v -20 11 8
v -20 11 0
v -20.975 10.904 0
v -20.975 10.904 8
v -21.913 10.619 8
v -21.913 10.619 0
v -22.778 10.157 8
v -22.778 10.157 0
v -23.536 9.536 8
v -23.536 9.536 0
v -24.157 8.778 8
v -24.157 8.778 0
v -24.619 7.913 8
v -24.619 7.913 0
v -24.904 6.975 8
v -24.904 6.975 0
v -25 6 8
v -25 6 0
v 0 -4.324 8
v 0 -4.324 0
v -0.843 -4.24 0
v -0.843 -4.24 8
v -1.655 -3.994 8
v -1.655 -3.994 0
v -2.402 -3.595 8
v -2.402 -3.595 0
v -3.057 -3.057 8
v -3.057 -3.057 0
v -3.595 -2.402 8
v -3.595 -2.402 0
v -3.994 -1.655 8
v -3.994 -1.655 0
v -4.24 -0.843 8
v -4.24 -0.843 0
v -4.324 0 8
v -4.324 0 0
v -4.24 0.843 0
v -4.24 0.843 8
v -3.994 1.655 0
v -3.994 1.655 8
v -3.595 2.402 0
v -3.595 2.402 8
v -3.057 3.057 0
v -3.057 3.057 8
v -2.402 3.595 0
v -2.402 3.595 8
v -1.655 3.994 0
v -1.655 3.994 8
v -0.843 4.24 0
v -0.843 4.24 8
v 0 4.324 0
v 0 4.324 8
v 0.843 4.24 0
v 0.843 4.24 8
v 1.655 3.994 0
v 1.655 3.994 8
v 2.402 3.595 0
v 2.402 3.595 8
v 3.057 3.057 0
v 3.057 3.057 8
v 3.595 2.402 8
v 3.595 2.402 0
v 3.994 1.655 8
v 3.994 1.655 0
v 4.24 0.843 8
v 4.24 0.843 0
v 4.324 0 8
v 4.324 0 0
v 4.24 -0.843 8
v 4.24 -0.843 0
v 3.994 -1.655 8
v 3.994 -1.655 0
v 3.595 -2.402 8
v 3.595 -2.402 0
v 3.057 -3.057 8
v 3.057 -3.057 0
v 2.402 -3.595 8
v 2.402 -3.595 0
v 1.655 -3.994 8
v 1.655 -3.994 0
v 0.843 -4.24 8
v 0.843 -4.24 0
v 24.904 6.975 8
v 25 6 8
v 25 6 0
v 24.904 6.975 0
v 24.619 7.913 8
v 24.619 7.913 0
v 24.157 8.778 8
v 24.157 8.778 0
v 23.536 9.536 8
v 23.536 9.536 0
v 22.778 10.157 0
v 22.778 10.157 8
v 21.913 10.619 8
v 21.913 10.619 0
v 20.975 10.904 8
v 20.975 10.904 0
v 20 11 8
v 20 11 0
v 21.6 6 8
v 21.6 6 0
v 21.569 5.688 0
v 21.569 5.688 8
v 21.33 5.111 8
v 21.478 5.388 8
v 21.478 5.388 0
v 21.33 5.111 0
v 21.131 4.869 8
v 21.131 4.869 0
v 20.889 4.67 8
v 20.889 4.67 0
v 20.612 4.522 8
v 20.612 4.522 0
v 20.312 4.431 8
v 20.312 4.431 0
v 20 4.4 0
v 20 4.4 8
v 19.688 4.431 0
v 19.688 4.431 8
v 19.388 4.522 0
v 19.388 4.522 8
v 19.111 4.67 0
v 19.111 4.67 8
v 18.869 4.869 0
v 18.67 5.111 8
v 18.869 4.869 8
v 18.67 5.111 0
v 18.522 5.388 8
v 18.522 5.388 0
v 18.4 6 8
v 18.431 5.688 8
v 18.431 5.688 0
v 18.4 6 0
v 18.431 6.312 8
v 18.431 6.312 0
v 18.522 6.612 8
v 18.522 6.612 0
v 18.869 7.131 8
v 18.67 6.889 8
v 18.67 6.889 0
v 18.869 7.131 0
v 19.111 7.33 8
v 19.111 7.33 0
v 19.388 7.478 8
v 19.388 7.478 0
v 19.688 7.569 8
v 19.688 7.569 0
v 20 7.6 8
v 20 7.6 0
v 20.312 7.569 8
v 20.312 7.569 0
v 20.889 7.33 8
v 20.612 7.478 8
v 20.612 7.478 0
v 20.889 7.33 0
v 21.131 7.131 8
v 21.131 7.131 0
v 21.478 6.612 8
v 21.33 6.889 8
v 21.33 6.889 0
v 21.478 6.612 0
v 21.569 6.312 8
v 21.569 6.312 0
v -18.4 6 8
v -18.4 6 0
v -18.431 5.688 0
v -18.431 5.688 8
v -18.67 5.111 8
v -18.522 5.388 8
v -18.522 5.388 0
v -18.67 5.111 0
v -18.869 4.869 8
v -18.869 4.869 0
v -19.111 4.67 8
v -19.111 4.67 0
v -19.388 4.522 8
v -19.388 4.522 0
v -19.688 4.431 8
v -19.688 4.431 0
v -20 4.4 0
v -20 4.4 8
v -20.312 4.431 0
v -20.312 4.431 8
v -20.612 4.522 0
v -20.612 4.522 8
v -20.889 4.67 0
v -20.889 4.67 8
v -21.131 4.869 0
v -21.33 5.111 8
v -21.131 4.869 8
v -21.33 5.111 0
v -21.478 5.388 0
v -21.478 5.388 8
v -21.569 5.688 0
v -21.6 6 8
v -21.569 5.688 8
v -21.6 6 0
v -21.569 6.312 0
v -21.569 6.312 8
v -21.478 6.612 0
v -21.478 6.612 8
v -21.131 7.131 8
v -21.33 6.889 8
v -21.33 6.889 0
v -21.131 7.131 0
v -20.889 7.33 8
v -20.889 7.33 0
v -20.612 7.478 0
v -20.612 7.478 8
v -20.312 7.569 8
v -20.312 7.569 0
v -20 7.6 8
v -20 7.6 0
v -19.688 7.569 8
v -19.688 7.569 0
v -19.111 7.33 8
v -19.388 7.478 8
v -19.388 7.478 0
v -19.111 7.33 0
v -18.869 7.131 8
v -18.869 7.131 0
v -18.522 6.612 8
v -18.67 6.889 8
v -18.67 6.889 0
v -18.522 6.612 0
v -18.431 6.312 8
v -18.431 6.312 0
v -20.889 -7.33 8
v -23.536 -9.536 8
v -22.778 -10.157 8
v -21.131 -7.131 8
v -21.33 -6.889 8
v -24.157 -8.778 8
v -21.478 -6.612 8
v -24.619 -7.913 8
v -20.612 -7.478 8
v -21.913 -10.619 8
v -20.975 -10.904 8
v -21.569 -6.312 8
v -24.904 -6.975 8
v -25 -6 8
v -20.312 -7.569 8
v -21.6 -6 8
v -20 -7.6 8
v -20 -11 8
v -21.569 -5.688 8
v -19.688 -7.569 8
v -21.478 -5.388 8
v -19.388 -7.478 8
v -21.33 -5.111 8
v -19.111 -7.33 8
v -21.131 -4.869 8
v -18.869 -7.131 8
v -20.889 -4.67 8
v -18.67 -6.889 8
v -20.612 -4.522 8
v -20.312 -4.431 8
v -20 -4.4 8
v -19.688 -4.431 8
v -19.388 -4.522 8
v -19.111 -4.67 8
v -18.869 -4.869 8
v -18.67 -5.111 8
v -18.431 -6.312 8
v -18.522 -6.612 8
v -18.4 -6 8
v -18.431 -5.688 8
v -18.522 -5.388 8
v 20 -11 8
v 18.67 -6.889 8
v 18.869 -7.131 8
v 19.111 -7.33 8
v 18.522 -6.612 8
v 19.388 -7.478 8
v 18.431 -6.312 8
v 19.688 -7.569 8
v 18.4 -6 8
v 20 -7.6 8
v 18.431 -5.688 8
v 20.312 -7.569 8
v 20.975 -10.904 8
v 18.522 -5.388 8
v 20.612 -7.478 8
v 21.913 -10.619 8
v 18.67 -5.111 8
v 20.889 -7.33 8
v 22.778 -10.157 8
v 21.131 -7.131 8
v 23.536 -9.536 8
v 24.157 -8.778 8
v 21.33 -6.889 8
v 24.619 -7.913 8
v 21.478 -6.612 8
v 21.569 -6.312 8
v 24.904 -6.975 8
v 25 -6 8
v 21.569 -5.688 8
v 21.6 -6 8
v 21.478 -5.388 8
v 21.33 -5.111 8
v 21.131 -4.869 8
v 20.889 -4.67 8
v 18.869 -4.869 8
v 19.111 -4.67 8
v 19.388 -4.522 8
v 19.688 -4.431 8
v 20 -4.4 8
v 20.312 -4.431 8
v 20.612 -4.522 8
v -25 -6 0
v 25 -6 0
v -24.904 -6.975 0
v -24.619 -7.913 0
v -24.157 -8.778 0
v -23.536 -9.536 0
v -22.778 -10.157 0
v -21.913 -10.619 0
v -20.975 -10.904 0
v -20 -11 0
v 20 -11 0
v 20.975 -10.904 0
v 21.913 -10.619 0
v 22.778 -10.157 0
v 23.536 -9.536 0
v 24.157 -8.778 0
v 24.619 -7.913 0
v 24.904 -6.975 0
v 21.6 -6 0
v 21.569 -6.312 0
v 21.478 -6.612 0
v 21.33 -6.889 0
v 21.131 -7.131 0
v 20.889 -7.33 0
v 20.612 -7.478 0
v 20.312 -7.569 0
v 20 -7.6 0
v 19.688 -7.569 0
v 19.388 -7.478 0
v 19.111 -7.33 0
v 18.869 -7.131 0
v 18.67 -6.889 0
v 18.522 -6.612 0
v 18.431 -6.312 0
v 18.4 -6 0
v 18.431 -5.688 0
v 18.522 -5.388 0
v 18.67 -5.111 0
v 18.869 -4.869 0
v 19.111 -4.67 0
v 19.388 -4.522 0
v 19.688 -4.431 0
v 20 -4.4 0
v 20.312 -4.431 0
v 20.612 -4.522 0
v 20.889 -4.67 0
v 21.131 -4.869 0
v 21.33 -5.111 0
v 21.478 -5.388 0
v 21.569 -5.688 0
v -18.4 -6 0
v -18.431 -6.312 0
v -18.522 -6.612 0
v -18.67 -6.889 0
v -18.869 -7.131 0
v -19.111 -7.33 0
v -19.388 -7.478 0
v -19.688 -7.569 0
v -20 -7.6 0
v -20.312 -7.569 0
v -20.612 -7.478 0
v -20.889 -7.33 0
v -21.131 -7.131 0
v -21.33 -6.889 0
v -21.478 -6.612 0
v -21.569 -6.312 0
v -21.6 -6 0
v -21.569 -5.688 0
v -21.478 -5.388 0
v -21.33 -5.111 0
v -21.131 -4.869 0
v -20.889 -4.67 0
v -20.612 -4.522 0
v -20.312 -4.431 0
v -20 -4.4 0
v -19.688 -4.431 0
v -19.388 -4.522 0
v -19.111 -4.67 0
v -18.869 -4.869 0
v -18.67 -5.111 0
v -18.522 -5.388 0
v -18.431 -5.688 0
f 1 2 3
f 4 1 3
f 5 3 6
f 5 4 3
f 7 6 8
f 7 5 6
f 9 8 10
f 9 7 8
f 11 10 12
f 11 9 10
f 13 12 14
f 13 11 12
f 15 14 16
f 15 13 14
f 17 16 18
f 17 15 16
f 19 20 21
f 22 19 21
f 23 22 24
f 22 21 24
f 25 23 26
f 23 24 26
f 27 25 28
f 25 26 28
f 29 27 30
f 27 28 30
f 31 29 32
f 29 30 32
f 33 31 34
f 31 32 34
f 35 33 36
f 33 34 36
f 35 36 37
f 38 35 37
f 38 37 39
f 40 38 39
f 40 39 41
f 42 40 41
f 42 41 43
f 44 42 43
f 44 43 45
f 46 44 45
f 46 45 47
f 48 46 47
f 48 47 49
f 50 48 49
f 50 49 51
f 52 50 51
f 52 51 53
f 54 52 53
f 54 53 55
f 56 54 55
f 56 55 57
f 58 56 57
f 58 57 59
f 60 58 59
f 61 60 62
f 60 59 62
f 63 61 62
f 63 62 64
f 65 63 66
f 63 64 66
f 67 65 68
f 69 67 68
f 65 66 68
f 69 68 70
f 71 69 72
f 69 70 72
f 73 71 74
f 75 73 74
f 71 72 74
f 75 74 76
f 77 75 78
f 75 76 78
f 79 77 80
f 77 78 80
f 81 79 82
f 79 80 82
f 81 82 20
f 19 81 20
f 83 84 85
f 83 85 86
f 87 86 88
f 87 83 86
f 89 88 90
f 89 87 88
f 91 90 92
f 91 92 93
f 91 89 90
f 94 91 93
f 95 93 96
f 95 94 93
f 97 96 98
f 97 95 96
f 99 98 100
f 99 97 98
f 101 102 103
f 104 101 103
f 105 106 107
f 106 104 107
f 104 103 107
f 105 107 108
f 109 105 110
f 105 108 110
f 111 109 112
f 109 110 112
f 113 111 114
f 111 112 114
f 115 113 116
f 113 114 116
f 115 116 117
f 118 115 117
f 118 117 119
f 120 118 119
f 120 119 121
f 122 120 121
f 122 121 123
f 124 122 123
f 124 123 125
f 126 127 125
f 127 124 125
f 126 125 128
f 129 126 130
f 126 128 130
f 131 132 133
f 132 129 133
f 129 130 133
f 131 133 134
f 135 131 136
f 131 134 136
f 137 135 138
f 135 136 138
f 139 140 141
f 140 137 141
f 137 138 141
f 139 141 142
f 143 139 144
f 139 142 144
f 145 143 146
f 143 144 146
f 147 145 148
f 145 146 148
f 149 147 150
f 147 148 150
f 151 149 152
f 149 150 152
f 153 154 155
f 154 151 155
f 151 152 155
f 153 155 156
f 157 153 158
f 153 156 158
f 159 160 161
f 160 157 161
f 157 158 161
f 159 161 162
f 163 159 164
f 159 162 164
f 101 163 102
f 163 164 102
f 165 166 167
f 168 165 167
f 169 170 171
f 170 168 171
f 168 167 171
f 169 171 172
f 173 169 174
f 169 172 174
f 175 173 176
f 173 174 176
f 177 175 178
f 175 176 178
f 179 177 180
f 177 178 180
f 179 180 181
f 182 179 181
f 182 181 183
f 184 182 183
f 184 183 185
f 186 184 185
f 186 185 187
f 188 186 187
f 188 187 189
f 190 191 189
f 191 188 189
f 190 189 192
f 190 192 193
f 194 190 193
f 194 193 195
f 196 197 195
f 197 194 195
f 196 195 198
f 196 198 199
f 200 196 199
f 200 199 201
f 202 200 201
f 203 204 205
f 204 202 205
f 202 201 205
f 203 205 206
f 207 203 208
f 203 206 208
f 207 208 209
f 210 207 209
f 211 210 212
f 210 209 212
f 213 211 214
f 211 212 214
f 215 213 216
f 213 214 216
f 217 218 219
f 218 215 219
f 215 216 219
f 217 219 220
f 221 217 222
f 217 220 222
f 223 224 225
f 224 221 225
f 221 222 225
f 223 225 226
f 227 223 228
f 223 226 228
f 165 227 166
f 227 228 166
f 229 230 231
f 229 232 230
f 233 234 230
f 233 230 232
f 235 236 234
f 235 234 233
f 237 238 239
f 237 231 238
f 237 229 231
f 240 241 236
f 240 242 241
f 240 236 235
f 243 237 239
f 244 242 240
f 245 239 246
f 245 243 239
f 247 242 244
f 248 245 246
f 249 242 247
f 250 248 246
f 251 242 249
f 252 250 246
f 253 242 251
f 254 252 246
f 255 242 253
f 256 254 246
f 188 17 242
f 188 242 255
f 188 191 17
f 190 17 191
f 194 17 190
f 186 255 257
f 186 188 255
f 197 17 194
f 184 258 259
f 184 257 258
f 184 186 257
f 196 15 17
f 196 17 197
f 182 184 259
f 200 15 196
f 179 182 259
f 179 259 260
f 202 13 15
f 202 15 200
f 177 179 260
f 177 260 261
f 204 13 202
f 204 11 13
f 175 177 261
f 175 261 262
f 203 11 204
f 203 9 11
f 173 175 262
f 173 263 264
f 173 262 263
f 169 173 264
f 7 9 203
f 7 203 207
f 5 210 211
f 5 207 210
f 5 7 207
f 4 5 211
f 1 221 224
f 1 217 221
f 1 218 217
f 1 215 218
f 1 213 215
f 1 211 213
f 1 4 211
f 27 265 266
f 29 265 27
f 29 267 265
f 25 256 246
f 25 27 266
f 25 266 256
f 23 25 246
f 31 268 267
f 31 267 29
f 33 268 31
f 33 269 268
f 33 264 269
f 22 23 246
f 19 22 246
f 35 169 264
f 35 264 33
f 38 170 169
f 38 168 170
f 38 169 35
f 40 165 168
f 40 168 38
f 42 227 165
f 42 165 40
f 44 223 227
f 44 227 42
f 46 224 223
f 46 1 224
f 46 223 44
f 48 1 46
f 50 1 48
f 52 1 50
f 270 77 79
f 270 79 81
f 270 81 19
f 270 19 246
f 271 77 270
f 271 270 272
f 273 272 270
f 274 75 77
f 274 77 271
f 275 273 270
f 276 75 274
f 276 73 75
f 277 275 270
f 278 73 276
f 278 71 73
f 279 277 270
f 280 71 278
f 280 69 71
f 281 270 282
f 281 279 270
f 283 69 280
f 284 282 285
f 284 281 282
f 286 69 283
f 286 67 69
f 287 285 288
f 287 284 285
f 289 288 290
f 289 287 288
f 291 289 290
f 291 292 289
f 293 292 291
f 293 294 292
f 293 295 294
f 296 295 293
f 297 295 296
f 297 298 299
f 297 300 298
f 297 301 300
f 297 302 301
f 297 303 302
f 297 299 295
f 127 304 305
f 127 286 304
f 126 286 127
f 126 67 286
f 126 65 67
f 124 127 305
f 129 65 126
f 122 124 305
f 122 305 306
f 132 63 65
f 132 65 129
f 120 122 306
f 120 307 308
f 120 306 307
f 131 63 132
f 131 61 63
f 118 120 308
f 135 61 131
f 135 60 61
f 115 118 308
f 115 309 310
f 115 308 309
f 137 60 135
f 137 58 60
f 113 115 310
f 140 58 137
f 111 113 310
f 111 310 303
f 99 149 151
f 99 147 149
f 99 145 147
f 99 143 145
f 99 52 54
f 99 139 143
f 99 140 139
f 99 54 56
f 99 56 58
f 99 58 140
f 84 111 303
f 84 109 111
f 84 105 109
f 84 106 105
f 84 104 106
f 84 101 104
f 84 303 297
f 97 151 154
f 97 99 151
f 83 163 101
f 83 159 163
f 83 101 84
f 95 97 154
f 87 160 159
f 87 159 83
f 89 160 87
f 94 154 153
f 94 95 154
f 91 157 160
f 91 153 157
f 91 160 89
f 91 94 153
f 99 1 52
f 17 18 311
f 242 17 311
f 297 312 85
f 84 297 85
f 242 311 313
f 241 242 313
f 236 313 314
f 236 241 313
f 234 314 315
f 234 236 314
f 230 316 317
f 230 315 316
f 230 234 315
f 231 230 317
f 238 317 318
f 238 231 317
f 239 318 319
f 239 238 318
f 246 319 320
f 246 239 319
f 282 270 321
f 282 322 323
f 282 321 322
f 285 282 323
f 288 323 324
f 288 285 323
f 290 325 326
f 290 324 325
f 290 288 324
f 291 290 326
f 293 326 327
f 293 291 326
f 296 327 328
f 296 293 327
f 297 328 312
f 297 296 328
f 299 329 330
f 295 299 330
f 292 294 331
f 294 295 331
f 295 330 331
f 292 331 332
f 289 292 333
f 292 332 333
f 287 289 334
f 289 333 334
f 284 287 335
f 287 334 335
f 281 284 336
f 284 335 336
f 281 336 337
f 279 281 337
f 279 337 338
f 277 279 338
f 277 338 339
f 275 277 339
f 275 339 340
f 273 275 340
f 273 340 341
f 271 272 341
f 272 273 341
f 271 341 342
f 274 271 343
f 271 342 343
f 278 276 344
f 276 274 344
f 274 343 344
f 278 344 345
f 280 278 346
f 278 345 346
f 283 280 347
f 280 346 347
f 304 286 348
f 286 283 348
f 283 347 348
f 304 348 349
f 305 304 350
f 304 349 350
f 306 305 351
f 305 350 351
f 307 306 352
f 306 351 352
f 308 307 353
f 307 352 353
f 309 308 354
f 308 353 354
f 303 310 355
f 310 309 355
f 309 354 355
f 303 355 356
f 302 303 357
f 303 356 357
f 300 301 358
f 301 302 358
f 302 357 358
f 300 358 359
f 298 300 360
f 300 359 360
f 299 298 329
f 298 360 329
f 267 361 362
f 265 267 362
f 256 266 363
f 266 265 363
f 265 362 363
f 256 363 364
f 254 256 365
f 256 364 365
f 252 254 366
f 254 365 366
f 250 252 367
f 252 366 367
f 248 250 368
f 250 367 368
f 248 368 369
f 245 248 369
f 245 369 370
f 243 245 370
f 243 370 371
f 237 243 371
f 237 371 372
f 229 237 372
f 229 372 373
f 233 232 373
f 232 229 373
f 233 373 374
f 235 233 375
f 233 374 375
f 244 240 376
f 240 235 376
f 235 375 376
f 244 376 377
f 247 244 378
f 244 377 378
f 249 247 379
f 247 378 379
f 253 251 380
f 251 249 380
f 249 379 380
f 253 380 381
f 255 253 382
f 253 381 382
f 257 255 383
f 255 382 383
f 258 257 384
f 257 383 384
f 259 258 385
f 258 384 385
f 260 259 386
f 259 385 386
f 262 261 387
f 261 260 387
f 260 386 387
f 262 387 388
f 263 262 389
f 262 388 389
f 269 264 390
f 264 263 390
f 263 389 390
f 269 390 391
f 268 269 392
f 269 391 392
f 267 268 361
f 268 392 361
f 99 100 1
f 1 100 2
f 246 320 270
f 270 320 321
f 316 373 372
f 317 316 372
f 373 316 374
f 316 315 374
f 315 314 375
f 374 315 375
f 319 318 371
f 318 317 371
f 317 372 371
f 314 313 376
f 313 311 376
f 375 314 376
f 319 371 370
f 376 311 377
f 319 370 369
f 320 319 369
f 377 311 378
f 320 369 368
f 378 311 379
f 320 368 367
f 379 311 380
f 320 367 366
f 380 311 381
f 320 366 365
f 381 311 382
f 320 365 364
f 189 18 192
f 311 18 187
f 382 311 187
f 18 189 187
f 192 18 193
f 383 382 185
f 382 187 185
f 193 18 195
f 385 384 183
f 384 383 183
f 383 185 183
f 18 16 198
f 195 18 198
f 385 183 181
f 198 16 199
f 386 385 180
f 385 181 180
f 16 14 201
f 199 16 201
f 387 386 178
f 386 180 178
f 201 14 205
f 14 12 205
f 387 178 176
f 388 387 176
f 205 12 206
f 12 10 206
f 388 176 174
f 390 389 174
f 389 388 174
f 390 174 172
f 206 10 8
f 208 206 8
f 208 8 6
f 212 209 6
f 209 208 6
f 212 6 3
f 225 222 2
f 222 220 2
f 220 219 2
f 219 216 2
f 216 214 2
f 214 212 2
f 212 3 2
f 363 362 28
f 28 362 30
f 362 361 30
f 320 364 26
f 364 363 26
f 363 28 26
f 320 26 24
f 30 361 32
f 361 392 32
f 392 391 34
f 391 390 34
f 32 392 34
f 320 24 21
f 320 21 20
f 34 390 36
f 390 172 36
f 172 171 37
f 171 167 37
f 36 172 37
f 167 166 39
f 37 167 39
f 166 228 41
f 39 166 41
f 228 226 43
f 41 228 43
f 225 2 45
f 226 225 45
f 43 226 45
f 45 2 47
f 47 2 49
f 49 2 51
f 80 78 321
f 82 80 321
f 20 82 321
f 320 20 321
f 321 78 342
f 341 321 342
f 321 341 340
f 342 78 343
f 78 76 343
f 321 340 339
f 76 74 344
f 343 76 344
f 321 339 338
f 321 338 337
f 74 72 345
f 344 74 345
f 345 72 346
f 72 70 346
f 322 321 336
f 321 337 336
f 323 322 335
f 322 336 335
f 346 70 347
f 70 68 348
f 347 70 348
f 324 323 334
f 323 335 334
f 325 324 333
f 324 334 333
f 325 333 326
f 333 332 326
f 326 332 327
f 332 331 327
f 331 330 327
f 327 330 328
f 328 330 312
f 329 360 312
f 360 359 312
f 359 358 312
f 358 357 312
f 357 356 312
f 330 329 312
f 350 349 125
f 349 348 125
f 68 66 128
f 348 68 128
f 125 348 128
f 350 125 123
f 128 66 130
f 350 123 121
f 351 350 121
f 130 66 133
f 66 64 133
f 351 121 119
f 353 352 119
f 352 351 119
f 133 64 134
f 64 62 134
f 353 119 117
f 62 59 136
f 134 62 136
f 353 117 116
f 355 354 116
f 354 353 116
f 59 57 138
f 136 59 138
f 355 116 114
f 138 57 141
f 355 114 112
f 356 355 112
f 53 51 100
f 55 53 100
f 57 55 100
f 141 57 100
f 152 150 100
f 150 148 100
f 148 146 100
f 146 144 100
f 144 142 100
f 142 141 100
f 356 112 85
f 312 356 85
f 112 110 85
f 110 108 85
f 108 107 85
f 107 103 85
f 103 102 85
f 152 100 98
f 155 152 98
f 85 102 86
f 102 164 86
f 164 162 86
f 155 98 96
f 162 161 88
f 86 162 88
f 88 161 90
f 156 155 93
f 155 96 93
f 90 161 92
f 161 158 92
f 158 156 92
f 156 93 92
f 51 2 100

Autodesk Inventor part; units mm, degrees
ref_plane "YZ Plane" through (0, 0, 0) normal (1, 0, 0) x (0, 1, 0)
ref_plane "XZ Plane" through (0, 0, 0) normal (0, 1, 0) x (-1, 0, 0)
ref_plane "XY Plane" through (0, 0, 0) normal (0, 0, 1) x (1, 0, 0)
sketch "スケッチ1" plane through (0, 0, 0) normal (0, 0, 1) x (1, 0, 0)
  line L0 (25, 11) -> (-25, 11)
  line L1 (-25, 11) -> (-25, -11)
  line L2 (-25, -11) -> (25, -11)
  line L3 (25, -11) -> (25, 11)
  line L4 (25, 11) -> (-25, -11) construction
  line L5 (-25, 11) -> (25, -11) construction
  circle A0 centre (-20, 6) radius 1.6
  circle A1 centre (-20, -6) radius 1.6
  circle A2 centre (20, 6) radius 1.6
  circle A3 centre (20, -6) radius 1.6
  point P0 (0, 0)
  dimension "d0" = 50
  dimension "d1" = 22
  dimension "d14" = 3.2
  dimension "d15" = 3.2
  dimension "d16" = 3.2
  dimension "d17" = 3.2
  dimension "d18" = 40
  dimension "d19" = 5
  dimension "d20" = 12
  dimension "d21" = 5
extrude "押し出し1" add sketch "スケッチ1" along normal blind 8
sketch "スケッチ2" plane through (0, 0, 8) normal (0, 0, 1) x (1, 0, 0)
  circle A0 centre (0, 0) radius 5
  dimension "d4" = 10
hole "穴1" at (0, 0, 8) direction (0, 0, -1) diameter 8.647 end through all thread size "M10x1.25" class "6H" standard "ANSI Metric M Profile"
fillet "フィレット1" radius 5 4 edges at (25, 11, 4) (25, -11, 4) (-25, 11, 4) (-25, -11, 4)
